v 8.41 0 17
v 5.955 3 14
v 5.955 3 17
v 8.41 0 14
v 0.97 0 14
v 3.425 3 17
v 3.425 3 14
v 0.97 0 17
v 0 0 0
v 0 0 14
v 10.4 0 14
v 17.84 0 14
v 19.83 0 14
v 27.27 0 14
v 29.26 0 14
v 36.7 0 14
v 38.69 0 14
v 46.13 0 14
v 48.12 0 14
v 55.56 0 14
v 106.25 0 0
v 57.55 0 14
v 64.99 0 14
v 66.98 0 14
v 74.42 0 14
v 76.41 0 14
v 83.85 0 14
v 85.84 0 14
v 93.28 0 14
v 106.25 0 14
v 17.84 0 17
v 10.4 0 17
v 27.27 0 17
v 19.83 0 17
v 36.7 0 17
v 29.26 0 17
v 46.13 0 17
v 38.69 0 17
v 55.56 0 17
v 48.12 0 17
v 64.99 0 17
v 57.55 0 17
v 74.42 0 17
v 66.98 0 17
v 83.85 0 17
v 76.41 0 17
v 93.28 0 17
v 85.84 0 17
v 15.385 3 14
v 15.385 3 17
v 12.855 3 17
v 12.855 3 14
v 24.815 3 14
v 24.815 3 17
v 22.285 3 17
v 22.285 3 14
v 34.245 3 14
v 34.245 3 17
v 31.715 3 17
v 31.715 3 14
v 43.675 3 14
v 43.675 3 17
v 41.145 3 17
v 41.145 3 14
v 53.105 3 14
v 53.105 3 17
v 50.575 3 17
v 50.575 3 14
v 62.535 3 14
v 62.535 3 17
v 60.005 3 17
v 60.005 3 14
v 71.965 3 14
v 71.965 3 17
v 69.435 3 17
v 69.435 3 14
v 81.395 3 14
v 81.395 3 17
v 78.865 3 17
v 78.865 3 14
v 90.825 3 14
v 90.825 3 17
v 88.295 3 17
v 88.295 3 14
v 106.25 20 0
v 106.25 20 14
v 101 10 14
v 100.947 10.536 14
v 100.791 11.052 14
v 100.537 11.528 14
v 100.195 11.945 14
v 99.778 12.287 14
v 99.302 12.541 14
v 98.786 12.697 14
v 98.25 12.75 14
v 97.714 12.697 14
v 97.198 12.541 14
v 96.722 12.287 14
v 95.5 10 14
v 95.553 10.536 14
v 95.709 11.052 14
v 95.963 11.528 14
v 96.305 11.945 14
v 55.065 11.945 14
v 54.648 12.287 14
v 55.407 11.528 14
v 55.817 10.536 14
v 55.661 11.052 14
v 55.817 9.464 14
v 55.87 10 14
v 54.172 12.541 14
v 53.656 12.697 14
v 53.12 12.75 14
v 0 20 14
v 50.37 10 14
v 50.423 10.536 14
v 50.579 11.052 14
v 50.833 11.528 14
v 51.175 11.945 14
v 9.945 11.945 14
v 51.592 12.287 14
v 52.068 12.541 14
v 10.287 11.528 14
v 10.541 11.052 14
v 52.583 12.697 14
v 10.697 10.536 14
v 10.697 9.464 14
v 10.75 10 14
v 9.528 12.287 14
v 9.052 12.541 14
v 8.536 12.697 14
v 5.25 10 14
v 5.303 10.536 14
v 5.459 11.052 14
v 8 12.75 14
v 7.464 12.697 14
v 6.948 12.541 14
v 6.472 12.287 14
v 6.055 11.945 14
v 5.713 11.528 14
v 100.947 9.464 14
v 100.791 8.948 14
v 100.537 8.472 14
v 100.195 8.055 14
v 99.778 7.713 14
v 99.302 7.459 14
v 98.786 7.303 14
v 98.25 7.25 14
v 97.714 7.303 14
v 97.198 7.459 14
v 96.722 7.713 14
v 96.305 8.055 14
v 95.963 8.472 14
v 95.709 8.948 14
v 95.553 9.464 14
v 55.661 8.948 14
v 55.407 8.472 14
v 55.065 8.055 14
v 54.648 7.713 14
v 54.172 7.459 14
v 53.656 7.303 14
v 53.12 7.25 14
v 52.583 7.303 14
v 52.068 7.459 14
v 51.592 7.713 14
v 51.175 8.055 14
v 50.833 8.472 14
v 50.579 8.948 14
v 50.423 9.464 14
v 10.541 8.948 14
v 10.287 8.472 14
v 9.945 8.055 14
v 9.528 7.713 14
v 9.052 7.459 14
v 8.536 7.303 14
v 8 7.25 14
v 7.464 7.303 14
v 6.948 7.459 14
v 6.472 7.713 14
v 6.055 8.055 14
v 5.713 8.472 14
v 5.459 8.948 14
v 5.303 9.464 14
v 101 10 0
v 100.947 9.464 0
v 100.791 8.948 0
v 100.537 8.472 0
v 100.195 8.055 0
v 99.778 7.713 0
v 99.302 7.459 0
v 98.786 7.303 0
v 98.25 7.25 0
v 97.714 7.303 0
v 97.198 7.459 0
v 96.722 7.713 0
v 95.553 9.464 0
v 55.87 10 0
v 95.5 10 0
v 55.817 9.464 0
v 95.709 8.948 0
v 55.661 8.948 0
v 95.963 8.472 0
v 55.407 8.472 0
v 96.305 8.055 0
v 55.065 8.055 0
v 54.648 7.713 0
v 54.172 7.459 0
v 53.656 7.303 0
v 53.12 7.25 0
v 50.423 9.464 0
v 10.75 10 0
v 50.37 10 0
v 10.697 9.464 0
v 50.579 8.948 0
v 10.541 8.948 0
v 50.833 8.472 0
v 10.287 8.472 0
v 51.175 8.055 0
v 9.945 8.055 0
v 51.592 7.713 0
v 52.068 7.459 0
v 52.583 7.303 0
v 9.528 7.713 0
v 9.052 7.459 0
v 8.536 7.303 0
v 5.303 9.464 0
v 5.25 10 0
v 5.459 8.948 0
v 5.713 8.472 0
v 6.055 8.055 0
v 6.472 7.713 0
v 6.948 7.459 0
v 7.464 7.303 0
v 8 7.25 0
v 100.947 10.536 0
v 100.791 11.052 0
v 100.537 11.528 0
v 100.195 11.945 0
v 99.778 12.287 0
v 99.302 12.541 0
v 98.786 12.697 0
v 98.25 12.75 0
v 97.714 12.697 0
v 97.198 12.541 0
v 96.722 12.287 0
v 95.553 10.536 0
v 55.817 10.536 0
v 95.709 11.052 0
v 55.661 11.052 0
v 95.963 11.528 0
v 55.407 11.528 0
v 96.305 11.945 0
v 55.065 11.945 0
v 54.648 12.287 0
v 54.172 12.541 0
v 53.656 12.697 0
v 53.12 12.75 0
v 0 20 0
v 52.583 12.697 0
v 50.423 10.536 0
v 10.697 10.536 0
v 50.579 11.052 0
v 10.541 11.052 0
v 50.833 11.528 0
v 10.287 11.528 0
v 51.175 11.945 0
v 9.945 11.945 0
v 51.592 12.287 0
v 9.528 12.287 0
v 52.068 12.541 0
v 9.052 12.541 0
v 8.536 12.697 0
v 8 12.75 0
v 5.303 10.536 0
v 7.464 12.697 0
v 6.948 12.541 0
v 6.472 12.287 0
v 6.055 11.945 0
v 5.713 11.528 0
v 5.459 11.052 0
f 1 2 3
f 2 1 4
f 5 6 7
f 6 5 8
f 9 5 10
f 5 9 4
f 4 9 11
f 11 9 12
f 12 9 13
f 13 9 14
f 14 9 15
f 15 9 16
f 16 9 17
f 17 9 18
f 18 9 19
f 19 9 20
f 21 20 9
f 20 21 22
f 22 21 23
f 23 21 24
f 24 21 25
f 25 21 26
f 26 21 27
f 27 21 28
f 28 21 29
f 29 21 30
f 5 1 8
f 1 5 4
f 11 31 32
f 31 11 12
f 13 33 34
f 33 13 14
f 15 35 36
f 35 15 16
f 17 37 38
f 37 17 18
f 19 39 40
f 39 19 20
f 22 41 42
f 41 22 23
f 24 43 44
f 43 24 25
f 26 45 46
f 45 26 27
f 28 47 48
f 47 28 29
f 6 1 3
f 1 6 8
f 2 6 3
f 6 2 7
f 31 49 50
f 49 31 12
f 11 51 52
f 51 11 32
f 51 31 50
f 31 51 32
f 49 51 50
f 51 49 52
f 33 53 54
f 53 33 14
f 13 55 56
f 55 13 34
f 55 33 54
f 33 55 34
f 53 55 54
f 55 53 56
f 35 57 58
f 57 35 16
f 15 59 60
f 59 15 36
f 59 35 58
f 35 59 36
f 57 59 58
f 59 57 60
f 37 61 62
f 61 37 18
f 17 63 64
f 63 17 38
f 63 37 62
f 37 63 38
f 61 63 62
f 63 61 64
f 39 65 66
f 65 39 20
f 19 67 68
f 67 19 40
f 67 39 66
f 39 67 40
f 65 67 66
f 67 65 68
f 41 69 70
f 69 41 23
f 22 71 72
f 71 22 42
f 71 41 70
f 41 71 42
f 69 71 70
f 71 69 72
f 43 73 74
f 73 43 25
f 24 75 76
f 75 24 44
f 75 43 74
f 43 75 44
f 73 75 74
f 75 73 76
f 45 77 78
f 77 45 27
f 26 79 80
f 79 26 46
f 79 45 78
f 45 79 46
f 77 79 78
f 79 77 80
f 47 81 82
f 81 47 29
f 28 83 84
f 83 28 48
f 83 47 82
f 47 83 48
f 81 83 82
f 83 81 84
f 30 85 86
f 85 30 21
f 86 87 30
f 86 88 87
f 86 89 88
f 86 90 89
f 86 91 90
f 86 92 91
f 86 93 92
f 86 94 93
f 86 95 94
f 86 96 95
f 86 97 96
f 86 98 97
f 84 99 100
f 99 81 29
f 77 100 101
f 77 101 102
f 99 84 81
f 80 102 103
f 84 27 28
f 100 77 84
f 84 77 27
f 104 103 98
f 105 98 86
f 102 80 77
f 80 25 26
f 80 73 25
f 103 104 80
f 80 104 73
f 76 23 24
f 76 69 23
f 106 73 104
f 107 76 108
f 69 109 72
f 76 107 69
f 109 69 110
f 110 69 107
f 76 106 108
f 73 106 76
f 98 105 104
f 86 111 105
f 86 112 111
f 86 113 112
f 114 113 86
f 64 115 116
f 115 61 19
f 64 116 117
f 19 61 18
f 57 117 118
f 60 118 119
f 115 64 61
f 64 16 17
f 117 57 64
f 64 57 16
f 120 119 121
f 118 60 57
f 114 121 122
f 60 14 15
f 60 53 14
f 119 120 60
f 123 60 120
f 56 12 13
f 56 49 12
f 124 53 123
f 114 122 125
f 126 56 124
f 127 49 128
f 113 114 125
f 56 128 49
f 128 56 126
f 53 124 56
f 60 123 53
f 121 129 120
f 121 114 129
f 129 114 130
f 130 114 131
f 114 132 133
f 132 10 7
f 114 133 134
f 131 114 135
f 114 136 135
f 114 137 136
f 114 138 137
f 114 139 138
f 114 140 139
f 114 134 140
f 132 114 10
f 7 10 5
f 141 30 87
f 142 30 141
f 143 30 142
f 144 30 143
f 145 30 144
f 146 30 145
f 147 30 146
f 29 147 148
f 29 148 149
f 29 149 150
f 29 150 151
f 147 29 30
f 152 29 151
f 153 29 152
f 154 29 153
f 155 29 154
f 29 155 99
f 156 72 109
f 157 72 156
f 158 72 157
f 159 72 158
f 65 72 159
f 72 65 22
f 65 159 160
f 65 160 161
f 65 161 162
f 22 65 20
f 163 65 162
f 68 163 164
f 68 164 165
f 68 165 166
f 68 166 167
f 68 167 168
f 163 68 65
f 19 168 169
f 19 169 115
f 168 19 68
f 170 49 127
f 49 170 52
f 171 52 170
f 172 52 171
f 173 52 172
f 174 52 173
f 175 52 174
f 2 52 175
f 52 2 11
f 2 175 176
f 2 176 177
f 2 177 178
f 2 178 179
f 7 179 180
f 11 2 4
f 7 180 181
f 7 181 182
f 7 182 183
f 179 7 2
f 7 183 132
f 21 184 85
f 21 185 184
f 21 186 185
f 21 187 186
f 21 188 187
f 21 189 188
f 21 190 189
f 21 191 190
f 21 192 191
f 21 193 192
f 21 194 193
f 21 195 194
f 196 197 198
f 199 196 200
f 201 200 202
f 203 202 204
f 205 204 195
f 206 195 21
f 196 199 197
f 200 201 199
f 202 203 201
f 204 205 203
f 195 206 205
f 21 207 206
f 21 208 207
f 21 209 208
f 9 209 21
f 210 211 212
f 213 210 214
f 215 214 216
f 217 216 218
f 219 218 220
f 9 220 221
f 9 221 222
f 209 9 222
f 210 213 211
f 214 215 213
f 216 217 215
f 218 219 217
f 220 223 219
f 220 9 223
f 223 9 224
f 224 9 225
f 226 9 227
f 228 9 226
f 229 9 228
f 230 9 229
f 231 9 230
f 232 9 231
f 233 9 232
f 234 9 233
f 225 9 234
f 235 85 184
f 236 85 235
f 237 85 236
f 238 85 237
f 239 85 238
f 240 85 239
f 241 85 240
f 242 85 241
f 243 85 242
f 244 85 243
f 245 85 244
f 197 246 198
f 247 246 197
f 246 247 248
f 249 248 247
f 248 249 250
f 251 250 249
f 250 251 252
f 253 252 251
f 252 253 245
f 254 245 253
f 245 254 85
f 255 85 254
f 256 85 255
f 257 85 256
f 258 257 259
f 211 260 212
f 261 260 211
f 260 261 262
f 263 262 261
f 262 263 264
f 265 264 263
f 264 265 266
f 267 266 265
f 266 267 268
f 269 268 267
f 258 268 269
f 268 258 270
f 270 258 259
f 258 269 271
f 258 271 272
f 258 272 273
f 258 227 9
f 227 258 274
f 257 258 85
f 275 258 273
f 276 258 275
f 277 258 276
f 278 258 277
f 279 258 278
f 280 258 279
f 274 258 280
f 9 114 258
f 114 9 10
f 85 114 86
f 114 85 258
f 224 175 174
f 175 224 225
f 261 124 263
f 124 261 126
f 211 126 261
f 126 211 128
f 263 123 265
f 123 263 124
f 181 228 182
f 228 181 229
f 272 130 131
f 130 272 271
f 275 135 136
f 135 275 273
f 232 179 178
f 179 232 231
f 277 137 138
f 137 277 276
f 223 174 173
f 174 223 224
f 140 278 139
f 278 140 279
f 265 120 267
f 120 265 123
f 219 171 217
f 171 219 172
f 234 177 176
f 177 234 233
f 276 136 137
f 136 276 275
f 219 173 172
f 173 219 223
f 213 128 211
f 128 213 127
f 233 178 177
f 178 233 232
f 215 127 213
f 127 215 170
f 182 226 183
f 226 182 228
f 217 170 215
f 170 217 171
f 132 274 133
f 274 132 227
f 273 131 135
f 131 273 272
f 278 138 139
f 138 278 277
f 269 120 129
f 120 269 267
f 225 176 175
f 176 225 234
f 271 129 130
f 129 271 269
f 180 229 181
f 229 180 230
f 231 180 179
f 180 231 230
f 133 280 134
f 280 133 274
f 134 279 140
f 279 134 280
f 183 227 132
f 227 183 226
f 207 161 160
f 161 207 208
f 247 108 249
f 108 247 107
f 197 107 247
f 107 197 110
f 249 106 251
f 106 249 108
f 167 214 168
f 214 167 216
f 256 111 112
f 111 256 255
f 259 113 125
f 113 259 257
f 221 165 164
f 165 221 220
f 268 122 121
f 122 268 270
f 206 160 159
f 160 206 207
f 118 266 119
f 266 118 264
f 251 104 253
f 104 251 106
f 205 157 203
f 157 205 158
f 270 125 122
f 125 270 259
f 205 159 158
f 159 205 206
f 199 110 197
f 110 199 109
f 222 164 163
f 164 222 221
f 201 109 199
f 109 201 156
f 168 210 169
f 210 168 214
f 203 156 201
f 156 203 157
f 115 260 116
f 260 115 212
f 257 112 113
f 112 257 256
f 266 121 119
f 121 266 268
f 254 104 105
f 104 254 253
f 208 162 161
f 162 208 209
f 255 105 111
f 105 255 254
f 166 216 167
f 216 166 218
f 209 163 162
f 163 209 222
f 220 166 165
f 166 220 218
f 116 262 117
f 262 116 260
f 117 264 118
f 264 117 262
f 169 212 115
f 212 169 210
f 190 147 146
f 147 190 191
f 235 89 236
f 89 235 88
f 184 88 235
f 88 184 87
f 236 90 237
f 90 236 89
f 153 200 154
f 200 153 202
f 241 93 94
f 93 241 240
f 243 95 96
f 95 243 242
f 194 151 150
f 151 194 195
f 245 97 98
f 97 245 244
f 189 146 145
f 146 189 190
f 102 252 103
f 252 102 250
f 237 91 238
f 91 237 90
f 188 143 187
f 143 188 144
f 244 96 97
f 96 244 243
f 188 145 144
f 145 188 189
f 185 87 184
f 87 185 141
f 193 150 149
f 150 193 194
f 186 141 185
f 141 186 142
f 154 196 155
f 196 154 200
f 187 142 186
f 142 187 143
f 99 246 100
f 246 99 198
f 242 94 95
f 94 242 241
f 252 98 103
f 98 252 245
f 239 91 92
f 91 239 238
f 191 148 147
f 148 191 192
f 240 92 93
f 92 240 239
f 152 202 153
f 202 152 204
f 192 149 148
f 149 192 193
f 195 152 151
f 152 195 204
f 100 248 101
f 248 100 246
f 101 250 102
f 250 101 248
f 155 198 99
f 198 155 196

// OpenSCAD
$fn = 32;

// ----------------------------------------------------------------------
// Gear rack: m=3 z=10, 106.25 x 20 x 17 mm
// ----------------------------------------------------------------------

// --- parameters (mm) ---
bar_len = 106.25;         // rack length, X
bar_w = 20;               // rack width, Y
bar_h = 17;               // overall height, Z
gear_module = 3;          // module
base_t = 14;              // tooth root line height
pitch = 9.43;             // circular pitch
tip_w = 2.53;             // tooth thickness at the tip
root_w = 7.44;            // tooth thickness at the root line
hole_d = 5.5;             // mounting hole
sink = 0.6;               // tooth root overlap into the body

tooth_span = 94.25;

module tooth(x0) {
  /* 20 deg flank profile, sunk into the body for a positive overlap */
  translate([x0, 0, base_t - sink])
    linear_extrude(height = bar_h - base_t + sink)
      polygon(points = [[-root_w / 2, 0], [root_w / 2, 0],
                        [tip_w / 2, bar_h - base_t],
                        [-tip_w / 2, bar_h - base_t]]);
}

difference() {
  union() {
    cube([bar_len, bar_w, base_t]);
    for (i = [0 : 10 - 1])
      tooth((i + 0.5) * pitch + (tooth_span - 10 * pitch) / 2);
  }
  translate([8, 10, -1]) cylinder(h = base_t + 2, d = hole_d);
  translate([53.12, 10, -1]) cylinder(h = base_t + 2, d = hole_d);
  translate([98.25, 10, -1]) cylinder(h = base_t + 2, d = hole_d);
}
